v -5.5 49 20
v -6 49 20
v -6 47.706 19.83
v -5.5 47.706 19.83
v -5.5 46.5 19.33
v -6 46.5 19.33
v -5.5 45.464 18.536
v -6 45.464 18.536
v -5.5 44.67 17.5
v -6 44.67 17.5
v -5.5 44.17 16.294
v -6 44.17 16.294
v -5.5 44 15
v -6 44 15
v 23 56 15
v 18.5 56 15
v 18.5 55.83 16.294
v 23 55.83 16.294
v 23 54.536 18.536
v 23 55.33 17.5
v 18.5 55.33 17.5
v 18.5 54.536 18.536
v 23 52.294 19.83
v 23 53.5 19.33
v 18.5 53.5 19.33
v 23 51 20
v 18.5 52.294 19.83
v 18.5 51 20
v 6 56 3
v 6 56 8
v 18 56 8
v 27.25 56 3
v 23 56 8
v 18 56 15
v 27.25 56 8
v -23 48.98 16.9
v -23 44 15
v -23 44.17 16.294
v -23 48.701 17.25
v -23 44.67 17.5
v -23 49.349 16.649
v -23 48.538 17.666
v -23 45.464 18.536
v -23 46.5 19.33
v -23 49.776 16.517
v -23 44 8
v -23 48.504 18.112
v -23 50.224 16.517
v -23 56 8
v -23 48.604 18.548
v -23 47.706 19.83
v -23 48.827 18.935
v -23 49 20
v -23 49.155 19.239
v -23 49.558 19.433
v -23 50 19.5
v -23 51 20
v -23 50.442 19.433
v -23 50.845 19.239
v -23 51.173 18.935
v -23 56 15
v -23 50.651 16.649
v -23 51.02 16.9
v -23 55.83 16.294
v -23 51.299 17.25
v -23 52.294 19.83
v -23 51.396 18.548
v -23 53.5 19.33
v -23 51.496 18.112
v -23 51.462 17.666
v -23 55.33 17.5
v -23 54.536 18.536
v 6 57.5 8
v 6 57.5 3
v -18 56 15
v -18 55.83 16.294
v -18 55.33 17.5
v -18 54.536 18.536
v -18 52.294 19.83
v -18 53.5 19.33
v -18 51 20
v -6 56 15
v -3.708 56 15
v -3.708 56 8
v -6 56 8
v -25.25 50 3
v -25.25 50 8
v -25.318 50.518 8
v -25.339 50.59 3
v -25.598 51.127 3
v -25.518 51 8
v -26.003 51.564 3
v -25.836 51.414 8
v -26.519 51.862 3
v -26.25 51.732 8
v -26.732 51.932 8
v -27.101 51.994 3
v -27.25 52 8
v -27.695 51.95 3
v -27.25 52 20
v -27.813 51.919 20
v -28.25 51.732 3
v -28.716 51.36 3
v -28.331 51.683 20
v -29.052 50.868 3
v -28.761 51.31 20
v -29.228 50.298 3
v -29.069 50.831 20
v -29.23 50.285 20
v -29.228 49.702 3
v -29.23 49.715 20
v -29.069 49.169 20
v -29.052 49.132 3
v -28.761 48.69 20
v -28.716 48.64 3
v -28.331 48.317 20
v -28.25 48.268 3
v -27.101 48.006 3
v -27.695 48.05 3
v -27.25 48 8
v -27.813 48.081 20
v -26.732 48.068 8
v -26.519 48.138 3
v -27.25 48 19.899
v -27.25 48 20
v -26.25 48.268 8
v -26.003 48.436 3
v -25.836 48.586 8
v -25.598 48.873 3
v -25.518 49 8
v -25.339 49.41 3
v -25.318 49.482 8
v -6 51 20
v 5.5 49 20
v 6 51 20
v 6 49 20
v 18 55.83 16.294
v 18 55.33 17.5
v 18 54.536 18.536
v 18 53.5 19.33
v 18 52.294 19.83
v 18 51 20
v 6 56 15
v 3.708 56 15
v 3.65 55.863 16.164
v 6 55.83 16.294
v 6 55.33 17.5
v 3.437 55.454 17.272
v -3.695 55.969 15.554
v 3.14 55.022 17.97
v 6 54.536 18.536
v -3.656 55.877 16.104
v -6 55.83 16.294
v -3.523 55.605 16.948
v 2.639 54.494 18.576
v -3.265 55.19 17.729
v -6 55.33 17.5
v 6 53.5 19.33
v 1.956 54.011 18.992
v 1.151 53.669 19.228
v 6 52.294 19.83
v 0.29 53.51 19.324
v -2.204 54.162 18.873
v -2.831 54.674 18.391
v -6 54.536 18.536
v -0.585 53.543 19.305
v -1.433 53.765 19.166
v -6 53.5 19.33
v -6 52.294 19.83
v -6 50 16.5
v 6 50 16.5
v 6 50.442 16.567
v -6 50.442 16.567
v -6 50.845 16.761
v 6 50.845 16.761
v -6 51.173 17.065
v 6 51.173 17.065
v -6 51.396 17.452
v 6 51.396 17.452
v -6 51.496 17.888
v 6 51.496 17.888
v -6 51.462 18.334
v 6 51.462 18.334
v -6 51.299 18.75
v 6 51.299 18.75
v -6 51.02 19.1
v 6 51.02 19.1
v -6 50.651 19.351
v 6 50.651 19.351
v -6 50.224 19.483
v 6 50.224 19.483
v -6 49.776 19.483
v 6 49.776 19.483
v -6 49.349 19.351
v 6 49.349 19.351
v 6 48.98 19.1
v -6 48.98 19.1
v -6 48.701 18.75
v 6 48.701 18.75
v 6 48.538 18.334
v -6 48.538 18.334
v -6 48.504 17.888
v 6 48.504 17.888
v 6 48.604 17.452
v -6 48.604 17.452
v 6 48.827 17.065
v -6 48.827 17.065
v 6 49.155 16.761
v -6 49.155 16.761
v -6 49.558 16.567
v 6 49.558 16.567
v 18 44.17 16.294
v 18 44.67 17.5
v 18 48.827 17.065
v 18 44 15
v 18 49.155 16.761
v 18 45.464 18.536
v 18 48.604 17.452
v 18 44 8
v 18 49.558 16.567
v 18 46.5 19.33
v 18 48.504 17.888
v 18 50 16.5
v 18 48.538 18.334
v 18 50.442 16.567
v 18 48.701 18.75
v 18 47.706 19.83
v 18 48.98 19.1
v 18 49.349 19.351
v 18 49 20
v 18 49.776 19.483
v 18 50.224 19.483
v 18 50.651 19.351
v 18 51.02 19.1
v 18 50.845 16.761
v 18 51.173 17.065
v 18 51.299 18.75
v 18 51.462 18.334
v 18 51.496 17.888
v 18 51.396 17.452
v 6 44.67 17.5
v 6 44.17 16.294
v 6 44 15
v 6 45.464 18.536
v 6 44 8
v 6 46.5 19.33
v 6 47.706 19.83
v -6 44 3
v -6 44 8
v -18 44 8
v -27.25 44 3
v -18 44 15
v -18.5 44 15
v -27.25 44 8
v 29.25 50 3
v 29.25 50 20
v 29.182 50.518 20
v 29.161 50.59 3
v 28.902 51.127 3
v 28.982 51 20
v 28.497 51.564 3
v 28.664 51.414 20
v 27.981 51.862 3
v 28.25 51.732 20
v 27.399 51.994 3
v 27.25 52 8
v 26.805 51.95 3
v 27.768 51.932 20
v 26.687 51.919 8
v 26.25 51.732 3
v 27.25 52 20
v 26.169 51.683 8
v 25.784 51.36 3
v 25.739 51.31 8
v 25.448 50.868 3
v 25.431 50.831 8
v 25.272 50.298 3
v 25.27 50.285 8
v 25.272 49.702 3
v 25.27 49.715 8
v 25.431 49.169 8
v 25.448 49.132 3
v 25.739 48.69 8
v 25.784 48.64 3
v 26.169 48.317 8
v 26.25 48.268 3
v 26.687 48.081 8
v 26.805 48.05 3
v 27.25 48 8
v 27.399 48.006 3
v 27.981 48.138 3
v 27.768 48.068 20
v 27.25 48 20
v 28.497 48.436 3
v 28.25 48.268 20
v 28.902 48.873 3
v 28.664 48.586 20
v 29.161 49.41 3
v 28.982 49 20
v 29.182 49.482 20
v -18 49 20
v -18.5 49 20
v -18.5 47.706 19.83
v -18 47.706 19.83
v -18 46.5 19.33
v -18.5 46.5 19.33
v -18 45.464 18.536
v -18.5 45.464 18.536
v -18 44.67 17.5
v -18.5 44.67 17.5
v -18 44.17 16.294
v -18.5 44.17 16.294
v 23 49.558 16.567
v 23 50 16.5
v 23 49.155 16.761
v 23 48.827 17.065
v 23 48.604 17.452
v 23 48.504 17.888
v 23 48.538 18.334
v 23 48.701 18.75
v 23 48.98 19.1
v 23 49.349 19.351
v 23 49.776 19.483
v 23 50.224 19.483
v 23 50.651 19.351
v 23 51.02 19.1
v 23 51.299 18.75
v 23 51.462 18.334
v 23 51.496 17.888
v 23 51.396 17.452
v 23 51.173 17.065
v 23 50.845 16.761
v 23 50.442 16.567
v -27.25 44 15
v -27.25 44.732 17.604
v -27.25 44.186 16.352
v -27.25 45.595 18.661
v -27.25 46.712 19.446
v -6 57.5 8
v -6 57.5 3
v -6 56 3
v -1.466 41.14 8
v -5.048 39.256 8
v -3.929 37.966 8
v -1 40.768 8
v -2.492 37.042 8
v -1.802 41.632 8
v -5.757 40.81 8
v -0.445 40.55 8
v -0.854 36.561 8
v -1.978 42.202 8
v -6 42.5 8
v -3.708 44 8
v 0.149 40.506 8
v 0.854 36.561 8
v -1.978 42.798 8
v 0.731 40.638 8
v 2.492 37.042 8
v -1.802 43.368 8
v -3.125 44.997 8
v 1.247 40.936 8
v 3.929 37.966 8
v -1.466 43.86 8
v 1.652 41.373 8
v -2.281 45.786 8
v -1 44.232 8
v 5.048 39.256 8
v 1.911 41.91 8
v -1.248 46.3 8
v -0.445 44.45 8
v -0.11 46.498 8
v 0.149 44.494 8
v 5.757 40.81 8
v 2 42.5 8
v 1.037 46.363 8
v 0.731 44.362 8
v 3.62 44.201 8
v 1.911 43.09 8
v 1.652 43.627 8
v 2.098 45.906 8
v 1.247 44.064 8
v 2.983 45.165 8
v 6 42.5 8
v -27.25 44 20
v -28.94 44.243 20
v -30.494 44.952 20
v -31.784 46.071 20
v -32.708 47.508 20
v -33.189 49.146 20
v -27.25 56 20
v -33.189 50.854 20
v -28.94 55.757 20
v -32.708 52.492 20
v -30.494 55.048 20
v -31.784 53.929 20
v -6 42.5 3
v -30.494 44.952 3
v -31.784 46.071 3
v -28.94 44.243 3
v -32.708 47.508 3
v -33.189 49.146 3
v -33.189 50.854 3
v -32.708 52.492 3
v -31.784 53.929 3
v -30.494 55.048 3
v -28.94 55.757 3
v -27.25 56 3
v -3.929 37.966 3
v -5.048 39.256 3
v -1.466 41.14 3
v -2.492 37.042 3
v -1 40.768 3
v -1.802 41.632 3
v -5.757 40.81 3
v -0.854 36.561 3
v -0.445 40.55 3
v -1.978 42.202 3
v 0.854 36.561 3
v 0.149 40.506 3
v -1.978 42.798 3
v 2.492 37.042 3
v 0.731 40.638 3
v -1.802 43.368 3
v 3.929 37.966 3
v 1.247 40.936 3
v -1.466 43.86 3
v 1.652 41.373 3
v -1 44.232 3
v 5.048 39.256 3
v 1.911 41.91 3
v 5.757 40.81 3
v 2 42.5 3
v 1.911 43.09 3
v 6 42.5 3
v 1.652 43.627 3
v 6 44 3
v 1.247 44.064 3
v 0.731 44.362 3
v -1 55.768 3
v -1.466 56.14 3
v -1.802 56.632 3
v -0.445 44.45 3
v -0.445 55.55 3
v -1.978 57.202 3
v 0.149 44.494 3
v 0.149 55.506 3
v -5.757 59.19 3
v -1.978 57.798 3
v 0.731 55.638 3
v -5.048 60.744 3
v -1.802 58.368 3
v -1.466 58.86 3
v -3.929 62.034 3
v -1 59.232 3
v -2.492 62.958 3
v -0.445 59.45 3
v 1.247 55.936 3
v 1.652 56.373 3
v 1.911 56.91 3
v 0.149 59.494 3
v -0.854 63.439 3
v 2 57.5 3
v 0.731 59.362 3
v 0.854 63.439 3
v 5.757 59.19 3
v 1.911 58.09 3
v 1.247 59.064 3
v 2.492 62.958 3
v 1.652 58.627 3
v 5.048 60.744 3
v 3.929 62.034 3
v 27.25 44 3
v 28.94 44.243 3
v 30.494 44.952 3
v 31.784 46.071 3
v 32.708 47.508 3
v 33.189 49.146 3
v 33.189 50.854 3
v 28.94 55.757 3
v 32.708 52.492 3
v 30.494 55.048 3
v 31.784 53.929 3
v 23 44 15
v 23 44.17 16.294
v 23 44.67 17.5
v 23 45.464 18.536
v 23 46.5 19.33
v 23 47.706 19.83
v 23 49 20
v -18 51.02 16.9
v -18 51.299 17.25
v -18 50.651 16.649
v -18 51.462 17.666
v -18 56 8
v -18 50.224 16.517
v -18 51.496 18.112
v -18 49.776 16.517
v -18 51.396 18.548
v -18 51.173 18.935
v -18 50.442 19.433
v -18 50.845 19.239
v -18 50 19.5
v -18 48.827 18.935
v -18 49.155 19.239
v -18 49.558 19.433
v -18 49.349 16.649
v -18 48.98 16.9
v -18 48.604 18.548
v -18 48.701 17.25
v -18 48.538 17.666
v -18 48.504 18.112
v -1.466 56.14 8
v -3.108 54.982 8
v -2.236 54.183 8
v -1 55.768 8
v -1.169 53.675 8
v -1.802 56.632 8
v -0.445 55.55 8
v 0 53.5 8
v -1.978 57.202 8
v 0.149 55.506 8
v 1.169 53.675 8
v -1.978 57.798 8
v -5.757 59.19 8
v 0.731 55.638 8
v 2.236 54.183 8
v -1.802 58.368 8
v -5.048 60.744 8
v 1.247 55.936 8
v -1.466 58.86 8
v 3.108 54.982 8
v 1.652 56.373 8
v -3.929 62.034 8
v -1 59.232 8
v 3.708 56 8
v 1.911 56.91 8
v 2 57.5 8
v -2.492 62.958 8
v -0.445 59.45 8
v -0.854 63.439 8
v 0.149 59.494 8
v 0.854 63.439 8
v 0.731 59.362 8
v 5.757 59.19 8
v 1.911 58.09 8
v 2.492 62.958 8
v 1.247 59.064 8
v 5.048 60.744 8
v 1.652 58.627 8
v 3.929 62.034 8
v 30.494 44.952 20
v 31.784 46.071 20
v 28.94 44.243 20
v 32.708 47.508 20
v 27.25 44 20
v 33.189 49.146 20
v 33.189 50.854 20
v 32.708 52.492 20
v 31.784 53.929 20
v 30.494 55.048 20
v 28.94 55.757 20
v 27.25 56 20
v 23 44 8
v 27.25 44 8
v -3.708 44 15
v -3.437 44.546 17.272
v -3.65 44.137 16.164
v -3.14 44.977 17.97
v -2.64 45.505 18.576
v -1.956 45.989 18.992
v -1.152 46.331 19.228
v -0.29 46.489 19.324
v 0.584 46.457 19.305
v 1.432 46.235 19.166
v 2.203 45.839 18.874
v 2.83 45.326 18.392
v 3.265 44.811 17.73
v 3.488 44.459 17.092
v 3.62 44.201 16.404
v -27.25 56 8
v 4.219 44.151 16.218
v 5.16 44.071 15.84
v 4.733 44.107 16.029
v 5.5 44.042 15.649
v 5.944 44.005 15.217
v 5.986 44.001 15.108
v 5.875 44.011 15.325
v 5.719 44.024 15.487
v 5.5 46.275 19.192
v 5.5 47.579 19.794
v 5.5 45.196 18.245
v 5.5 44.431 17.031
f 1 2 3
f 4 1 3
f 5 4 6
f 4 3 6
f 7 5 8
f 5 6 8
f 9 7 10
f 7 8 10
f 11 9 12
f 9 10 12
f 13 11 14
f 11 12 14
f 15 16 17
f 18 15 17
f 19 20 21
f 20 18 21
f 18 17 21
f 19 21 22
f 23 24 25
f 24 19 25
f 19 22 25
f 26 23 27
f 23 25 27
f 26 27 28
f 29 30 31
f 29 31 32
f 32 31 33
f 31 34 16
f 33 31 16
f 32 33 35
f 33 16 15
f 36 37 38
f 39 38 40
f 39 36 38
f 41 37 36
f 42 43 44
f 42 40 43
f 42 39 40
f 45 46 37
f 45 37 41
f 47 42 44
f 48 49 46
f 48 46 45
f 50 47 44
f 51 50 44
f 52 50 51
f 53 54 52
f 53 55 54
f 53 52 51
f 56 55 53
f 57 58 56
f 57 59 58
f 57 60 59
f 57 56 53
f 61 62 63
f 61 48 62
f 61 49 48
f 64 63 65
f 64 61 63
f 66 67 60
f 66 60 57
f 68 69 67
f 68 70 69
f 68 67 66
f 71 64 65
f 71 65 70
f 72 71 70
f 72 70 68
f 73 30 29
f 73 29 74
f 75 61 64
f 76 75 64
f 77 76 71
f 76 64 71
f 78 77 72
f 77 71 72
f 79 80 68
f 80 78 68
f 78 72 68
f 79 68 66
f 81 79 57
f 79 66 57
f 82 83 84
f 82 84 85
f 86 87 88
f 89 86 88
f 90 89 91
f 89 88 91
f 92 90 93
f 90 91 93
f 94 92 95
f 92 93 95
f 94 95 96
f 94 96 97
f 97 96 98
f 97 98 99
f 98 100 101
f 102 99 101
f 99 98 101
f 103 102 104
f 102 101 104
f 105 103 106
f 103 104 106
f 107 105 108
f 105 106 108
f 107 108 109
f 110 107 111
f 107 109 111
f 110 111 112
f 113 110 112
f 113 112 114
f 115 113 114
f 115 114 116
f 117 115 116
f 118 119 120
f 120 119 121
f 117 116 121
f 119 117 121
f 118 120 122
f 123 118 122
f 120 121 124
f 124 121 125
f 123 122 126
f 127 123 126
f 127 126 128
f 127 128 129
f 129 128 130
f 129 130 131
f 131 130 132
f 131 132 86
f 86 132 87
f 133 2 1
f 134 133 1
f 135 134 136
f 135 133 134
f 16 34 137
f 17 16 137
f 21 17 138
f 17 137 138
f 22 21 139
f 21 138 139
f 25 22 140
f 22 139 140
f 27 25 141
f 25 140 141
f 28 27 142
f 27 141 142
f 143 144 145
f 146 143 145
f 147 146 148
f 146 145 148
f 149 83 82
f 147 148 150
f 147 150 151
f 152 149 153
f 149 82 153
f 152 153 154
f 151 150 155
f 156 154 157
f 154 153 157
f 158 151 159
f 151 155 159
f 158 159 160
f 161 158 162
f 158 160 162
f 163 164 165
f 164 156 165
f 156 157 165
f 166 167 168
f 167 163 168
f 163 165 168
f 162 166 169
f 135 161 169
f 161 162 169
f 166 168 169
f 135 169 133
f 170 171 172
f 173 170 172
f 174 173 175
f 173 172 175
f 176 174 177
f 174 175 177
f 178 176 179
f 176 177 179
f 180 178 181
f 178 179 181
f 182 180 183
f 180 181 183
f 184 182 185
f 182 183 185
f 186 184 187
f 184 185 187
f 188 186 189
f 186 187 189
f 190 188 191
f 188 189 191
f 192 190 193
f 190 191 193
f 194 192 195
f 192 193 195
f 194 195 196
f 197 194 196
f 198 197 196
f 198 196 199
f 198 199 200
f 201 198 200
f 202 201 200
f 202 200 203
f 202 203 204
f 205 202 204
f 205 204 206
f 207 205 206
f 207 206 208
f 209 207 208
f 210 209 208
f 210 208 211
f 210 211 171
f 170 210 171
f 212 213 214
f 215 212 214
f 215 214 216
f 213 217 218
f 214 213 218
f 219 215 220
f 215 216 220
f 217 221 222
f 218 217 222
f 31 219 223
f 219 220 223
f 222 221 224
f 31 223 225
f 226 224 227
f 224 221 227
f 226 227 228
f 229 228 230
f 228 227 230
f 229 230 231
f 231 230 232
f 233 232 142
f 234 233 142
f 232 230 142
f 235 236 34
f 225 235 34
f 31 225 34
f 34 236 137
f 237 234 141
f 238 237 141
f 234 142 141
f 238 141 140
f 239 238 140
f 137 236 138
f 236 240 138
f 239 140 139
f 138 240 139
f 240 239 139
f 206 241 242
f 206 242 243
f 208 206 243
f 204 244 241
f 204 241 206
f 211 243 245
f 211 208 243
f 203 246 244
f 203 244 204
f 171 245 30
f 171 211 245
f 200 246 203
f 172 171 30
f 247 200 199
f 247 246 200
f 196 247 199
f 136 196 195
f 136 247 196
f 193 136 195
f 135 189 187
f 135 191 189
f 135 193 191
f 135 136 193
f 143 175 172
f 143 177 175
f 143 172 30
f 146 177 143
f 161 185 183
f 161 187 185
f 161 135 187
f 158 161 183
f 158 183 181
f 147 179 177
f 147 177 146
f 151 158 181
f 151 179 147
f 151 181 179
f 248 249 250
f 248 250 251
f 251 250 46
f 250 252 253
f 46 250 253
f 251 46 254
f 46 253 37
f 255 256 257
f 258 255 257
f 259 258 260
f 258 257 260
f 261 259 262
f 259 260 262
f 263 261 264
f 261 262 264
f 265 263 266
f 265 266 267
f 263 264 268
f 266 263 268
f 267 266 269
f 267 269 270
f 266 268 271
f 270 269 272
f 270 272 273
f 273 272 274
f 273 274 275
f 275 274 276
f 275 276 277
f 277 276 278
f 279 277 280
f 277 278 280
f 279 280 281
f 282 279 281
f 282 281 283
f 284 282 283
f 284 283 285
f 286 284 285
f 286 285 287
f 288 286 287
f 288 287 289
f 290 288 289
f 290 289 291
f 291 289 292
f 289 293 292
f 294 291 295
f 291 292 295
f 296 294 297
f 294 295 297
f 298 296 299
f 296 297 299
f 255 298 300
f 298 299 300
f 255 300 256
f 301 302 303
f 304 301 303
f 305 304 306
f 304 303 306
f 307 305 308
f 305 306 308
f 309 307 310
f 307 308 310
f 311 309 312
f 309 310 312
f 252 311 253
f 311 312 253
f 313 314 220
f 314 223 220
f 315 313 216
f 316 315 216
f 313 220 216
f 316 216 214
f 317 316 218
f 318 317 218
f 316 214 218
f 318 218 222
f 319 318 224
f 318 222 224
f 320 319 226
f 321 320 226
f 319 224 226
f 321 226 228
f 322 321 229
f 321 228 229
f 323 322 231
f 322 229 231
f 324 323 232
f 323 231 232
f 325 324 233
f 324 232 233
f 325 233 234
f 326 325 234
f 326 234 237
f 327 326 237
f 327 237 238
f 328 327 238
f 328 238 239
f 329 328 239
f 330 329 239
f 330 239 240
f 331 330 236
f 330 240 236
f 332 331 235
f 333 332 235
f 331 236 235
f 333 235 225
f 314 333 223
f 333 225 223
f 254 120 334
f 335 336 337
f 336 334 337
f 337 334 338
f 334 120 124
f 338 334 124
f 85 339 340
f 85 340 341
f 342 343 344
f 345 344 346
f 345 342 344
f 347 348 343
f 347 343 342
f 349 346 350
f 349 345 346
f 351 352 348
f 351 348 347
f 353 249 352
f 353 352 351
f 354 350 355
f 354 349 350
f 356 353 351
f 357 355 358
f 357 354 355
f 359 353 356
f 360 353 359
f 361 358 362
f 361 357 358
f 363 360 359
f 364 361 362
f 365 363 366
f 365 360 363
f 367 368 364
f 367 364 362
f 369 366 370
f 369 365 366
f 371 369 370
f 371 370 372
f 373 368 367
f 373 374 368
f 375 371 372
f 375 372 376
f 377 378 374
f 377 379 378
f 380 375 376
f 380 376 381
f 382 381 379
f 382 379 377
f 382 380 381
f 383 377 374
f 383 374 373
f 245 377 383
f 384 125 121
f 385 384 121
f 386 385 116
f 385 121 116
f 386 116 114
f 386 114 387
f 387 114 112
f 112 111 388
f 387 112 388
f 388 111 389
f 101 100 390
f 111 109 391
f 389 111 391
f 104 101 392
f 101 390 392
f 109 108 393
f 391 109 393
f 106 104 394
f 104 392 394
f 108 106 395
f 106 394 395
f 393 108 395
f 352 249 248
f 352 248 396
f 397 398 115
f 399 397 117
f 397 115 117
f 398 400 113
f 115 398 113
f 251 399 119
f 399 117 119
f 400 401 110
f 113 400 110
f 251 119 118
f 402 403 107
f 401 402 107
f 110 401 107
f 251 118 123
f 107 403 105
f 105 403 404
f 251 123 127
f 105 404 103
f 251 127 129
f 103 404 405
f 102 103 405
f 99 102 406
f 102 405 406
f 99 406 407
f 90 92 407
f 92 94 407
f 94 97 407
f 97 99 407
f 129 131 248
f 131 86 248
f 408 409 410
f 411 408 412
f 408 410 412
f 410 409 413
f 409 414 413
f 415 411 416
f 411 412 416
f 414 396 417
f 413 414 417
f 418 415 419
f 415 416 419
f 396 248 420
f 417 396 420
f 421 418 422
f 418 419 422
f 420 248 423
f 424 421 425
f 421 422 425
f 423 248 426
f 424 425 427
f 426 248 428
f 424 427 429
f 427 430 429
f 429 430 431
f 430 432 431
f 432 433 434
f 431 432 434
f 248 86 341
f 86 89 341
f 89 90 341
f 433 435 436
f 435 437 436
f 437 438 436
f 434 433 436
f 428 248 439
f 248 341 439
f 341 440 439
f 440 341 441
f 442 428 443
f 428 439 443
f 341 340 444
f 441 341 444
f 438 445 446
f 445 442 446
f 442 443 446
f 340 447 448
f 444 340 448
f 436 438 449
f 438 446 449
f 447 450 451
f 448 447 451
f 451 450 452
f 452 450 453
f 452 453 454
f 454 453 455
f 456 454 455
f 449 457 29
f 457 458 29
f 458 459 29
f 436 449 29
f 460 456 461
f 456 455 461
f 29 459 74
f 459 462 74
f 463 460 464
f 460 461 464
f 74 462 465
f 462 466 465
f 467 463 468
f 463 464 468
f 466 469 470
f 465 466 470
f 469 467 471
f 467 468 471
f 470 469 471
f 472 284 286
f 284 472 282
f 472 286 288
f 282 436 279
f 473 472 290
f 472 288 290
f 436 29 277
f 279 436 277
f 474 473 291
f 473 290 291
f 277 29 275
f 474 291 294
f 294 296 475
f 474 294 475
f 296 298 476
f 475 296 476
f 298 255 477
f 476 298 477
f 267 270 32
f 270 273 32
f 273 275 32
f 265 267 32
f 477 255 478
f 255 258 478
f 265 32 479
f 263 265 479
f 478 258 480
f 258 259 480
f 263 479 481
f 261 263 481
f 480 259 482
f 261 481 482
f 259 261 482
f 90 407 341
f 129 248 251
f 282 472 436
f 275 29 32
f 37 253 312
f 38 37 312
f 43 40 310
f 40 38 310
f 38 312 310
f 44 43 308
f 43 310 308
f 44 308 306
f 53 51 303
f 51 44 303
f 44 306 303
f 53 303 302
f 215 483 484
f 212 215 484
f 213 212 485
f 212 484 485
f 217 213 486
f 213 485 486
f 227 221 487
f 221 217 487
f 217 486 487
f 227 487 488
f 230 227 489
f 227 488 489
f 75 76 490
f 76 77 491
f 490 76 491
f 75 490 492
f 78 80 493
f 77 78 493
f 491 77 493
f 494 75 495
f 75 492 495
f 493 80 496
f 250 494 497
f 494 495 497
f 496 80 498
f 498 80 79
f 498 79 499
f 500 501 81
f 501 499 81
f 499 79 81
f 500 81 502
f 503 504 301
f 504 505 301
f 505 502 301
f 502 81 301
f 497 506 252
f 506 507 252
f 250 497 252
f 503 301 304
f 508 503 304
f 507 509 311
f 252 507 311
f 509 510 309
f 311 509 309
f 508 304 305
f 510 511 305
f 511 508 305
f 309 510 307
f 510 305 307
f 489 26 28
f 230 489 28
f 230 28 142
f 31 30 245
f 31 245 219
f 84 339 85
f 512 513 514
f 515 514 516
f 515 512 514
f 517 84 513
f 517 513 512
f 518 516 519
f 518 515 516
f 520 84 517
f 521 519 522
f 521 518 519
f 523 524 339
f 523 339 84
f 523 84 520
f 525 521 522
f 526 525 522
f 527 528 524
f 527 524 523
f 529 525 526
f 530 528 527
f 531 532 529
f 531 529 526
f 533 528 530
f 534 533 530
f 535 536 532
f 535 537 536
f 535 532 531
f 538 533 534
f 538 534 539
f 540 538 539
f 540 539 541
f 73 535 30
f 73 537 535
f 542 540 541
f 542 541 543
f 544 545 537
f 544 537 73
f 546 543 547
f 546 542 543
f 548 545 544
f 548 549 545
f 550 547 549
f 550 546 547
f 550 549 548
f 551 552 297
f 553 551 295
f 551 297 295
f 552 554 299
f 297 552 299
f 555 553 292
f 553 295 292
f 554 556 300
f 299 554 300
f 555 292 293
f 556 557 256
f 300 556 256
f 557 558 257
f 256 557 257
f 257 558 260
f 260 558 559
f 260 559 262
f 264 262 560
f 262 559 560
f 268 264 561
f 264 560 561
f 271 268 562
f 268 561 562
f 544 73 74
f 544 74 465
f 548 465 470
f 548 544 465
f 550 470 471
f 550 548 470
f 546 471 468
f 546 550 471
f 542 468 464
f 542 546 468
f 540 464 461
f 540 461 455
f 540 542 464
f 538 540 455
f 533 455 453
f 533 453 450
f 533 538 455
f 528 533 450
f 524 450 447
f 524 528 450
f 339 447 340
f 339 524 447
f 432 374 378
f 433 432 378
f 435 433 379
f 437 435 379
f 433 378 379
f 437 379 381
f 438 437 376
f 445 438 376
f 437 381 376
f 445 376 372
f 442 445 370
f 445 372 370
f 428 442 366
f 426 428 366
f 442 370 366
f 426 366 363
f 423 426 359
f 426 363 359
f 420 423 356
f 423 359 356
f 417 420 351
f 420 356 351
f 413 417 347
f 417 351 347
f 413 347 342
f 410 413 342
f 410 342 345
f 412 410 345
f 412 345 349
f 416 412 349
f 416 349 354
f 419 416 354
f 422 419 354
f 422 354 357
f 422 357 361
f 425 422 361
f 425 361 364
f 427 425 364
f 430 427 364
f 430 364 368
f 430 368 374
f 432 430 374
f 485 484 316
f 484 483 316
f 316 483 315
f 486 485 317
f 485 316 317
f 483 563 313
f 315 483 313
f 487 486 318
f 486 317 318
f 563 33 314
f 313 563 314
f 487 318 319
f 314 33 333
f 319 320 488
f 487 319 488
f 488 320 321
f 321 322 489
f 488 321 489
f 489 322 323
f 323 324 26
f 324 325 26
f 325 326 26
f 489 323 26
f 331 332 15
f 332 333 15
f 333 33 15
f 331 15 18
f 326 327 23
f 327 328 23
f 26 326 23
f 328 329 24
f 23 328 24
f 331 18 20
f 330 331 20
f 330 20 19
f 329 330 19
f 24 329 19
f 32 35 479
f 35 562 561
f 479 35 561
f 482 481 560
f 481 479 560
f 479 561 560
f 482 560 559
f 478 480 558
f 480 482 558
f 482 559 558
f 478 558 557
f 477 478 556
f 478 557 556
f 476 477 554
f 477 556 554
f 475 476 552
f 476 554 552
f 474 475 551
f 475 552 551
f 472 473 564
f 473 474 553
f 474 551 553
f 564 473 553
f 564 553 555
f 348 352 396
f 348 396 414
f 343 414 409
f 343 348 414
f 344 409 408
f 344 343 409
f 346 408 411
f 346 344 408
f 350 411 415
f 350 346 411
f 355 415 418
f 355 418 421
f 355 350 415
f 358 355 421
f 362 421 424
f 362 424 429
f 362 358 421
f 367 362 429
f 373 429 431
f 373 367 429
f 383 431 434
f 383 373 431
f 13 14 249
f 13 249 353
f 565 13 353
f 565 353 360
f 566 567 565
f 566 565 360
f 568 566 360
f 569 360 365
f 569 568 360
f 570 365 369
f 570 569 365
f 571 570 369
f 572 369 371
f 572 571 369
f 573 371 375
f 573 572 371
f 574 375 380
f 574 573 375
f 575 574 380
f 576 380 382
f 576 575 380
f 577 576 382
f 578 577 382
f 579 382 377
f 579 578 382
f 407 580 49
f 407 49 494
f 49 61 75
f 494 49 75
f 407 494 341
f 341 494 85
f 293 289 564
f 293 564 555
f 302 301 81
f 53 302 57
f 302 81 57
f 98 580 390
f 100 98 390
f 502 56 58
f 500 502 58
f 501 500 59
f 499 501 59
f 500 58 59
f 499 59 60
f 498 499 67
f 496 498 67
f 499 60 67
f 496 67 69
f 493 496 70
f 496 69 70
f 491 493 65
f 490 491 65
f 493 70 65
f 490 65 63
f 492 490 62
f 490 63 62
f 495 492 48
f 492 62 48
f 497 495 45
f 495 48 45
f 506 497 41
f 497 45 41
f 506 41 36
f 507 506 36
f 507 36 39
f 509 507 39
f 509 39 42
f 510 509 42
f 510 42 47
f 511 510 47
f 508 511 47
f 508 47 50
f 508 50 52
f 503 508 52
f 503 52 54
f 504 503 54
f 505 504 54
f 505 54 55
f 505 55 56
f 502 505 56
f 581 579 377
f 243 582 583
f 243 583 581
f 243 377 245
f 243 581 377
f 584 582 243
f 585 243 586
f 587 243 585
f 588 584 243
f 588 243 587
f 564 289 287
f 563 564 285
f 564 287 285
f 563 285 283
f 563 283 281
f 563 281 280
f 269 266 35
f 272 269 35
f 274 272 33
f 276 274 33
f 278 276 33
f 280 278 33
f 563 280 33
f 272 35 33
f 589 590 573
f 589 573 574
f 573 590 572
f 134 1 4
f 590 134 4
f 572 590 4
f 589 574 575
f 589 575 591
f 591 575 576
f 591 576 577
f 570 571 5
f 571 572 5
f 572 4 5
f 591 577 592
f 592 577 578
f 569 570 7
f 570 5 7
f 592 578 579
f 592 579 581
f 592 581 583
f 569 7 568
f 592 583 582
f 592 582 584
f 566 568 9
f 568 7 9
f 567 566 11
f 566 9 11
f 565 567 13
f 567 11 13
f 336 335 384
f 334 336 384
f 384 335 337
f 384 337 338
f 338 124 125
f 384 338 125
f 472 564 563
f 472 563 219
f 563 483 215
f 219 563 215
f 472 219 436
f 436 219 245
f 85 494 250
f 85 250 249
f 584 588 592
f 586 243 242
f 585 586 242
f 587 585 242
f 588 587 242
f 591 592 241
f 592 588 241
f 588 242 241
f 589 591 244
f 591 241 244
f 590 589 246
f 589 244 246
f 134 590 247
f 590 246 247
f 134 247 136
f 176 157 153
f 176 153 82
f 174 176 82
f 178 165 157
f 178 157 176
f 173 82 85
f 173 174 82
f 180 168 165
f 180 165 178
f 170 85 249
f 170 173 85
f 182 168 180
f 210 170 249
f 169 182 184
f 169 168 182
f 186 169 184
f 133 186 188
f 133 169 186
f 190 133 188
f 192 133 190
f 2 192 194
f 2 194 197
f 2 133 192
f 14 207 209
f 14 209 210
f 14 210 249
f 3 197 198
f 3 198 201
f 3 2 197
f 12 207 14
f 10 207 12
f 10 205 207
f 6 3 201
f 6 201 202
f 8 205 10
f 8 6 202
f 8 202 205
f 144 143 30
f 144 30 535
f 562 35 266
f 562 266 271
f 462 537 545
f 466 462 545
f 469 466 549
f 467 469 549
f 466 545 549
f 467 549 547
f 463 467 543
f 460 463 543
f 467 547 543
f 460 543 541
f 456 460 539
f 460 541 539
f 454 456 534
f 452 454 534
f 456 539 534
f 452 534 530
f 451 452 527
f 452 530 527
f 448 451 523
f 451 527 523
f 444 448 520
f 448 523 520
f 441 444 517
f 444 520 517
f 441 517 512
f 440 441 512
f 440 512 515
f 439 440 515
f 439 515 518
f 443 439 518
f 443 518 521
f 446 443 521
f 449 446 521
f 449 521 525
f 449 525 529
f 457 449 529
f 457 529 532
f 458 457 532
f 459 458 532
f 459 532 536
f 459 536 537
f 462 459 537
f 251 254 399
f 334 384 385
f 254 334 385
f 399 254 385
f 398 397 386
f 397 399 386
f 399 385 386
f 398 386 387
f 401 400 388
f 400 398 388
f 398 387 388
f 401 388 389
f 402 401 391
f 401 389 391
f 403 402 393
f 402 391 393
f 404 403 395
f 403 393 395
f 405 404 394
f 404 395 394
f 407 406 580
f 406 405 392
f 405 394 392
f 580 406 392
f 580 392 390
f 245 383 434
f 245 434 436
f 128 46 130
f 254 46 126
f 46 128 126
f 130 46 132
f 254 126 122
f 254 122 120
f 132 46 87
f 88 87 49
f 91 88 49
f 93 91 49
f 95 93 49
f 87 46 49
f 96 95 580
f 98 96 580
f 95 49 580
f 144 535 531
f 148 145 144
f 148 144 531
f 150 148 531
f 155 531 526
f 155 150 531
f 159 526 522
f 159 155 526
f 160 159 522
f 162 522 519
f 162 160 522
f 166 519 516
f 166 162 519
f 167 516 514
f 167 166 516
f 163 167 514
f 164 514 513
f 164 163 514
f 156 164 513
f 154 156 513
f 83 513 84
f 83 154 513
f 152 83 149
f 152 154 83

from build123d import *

# Parameters (mm, degrees)
BOSS_EXTRUDE1_DEPTH          = 5
BOSS_EXTRUDE2_START          = 12
BOSS_EXTRUDE2_DEPTH          = 12
BOSS_EXTRUDE3_START          = 12
BOSS_EXTRUDE3_DEPTH          = 12
SKETCH4_W                    = 4.25
SKETCH4_H                    = 12
CUT_EXTRUDE1_DEPTH           = 44.425942707
SKETCH5_W                    = 4.25
SKETCH5_H                    = 12
CUT_EXTRUDE2_DEPTH           = 44.425942707
BOSS_EXTRUDE4_REACH          = 75.667
F_3_0_3_DIAMETER_HOLE1_D     = 3
F_3_0_3_DIAMETER_HOLE1_DEPTH = 12
SKETCH9_W                    = 1.5
SKETCH9_H                    = 5
F_3_0_3_DIAMETER_HOLE3_D     = 3
F_3_0_3_DIAMETER_HOLE3_DEPTH = 5
F_4_0_4_DIAMETER_HOLE1_D     = 4
F_4_0_4_DIAMETER_HOLE1_DEPTH = 17
FILLET1_R                    = 5
SKETCH15_W                   = 102.81130979
SKETCH15_H                   = 78.647232544
CUT_EXTRUDE3_DEPTH           = 10


with BuildPart() as part:
    # Sketch1 → Boss-Extrude1 (new body)
    with BuildSketch(Plane.XY.offset(8)):
        with BuildLine():
            Line((-6, 57.5), (-6, 56))
            Line((-6, 56), (-27.25, 56))
            ThreePointArc((-27.25, 56), (-33.25, 50), (-27.25, 44))
            Line((-27.25, 44), (-6, 44))
            Line((-6, 44), (-6, 42.5))
            ThreePointArc((-6, 42.5), (0, 36.5), (6, 42.5))
            Line((6, 42.5), (6, 44))
            Line((6, 44), (27.25, 44))
            ThreePointArc((27.25, 44), (33.25, 50), (27.25, 56))
            Line((27.25, 56), (6, 56))
            Line((6, 56), (6, 57.5))
            ThreePointArc((6, 57.5), (0, 63.5), (-6, 57.5))
        make_face()
    extrude(amount=-BOSS_EXTRUDE1_DEPTH)

    # Sketch2 → Boss-Extrude2 (add)
    with BuildSketch(Plane.XY.offset(8).offset(BOSS_EXTRUDE2_START)):
        with BuildLine():
            Line((27.25, 44), (18, 44))
            Line((18, 44), (18, 56))
            Line((18, 56), (27.25, 56))
            ThreePointArc((27.25, 56), (33.25, 50), (27.25, 44))
        make_face()
    extrude(amount=-BOSS_EXTRUDE2_DEPTH)

    # Sketch3 → Boss-Extrude3 (add)
    with BuildSketch(Plane.XY.offset(8).offset(BOSS_EXTRUDE3_START)):
        with BuildLine():
            Line((-27.25, 56), (-18, 56))
            Line((-18, 56), (-18, 44))
            Line((-18, 44), (-27.25, 44))
            ThreePointArc((-27.25, 44), (-33.25, 50), (-27.25, 56))
        make_face()
    extrude(amount=-BOSS_EXTRUDE3_DEPTH)

    # Sketch4 → Cut-Extrude1 (cut, through all)
    with BuildSketch(Plane(origin=(0, 56, 0), x_dir=(-1, 0, 0), z_dir=(0, 1, 0))):
        with Locations((-25.125, 14)):
            Rectangle(SKETCH4_W, SKETCH4_H)
    extrude(amount=-CUT_EXTRUDE1_DEPTH, mode=Mode.SUBTRACT)

    # Sketch5 → Cut-Extrude2 (cut, through all)
    with BuildSketch(Plane(origin=(0, 56, 0), x_dir=(-1, 0, 0), z_dir=(0, 1, 0))):
        with Locations((25.125, 14)):
            Rectangle(SKETCH5_W, SKETCH5_H)
    extrude(amount=-CUT_EXTRUDE2_DEPTH, mode=Mode.SUBTRACT)

    # Sketch6 → Boss-Extrude4 (add, up to next)
    with BuildSketch(Plane.XY.offset(20), mode=Mode.PRIVATE) as boss_extrude4_sk1:
        with BuildLine():
            Line((6, 44), (6, 56))
            Line((6, 56), (3.708099244, 56))
            ThreePointArc((3.708099244, 56), (0, 53.5), (-3.708099244, 56))
            Line((-3.708099244, 56), (-6, 56))
            Line((-6, 56), (-6, 44))
            Line((-6, 44), (-3.708099244, 44))
            ThreePointArc((-3.708099244, 44), (-0.109747314, 46.498494157), (3.620236982, 44.201142026))
            Line((3.620236982, 44.201142026), (6, 44))
        make_face()
    boss_extrude4_tool1 = extrude(boss_extrude4_sk1.sketch, amount=-BOSS_EXTRUDE4_REACH, mode=Mode.PRIVATE) - part.part
    add(boss_extrude4_tool1.solids().sort_by_distance((-0.008751, 50.011684, 20))[0])

    # Ø3.0 (3) Diameter Hole1
    with Locations(Plane.ZY.offset(6)):
        with Locations((18, 50)):
            Hole(F_3_0_3_DIAMETER_HOLE1_D / 2, depth=F_3_0_3_DIAMETER_HOLE1_DEPTH)

    # Sketch9 → Ø3.0 (3) Diameter Hole2 (revolve, cut)
    with BuildSketch(Plane(origin=(23, 50, 18), x_dir=(0, 0, -1), z_dir=(0, 1, 0))):
        with Locations((0.75, 2.5)):
            Rectangle(SKETCH9_W, SKETCH9_H)
    revolve(axis=Axis((29.35, 50, 18), (-1, 0, 0)), mode=Mode.SUBTRACT)

    # Ø3.0 (3) Diameter Hole3
    with Locations(Plane(origin=(-18, 0, 0), x_dir=(0, 0, -1), z_dir=(1, 0, 0))):
        with Locations((-18, 50)):
            Hole(F_3_0_3_DIAMETER_HOLE3_D / 2, depth=F_3_0_3_DIAMETER_HOLE3_DEPTH)

    # Ø4.0 (4) Diameter Hole1
    with Locations(Plane(origin=(0, 0, 3), x_dir=(-1, 0, 0), z_dir=(0, 0, -1))):
        with Locations((0, 57.5), (-27.25, 50), (27.25, 50), (0, 42.5)):
            Hole(F_4_0_4_DIAMETER_HOLE1_D / 2, depth=F_4_0_4_DIAMETER_HOLE1_DEPTH)

    # Fillet1
    # the kernel refuses this fillet: 5 mm, written as the material it takes off along each edge
    with BuildSketch(Plane(origin=(-35.5, 56, 20), x_dir=(0, 0, -1), z_dir=(1, 0, 0))) as fillet1_piece_1_section:
        with BuildLine():
            CenterArc((FILLET1_R, -FILLET1_R), FILLET1_R, 90, 90)
            Line((0, -FILLET1_R), (0, 0))
            Line((0, 0), (FILLET1_R, 0))
        make_face()
    fillet1_piece_1 = extrude(amount=30, mode=Mode.PRIVATE)
    fillet1_piece_1 = split(fillet1_piece_1, bisect_by=Plane(origin=(-27.25, 53.041631107, 19.755841734), z_dir=(1, 0, 0)), keep=Keep.TOP, mode=Mode.PRIVATE)
    add(fillet1_piece_1, mode=Mode.SUBTRACT)
    with BuildSketch(Plane(origin=(35.5, 44, 20), x_dir=(0, 0, -1), z_dir=(-1, 0, 0))) as fillet1_piece_2_section:
        with BuildLine():
            CenterArc((FILLET1_R, -FILLET1_R), FILLET1_R, 90, 90)
            Line((0, -FILLET1_R), (0, 0))
            Line((0, 0), (FILLET1_R, 0))
        make_face()
    fillet1_piece_2 = extrude(amount=30, mode=Mode.PRIVATE)
    fillet1_piece_2 = split(fillet1_piece_2, bisect_by=Plane(origin=(27.25, 46.958368888, 19.755841732), z_dir=(-1, 0, 0)), keep=Keep.TOP, mode=Mode.PRIVATE)
    add(fillet1_piece_2, mode=Mode.SUBTRACT)
    with BuildSketch(Plane(origin=(5.5, 56, 20), x_dir=(0, 0, -1), z_dir=(1, 0, 0))) as fillet1_piece_3_section:
        with BuildLine():
            CenterArc((FILLET1_R, -FILLET1_R), FILLET1_R, 90, 90)
            Line((0, -FILLET1_R), (0, 0))
            Line((0, 0), (FILLET1_R, 0))
        make_face()
    fillet1_piece_3 = extrude(amount=30, mode=Mode.PRIVATE)
    fillet1_piece_3 = split(fillet1_piece_3, bisect_by=Plane(origin=(27.25, 54.883160305, 18.883160305), z_dir=(-1, 0, 0)), keep=Keep.TOP, mode=Mode.PRIVATE)
    add(fillet1_piece_3, mode=Mode.SUBTRACT)
    with BuildSketch(Plane(origin=(-18.5, 44, 20), x_dir=(0, 1, 0), z_dir=(1, 0, 0))) as fillet1_piece_4:
        with BuildLine():
            CenterArc((FILLET1_R, -FILLET1_R), FILLET1_R, 90, 90)
            Line((0, -FILLET1_R), (0, 0))
            Line((0, 0), (FILLET1_R, 0))
        make_face()
    extrude(amount=27.291900756, mode=Mode.SUBTRACT)
    with BuildSketch(Plane(origin=(18.5, 56, 20), x_dir=(0, 0, -1), z_dir=(-1, 0, 0))) as fillet1_piece_5:
        with BuildLine():
            CenterArc((FILLET1_R, FILLET1_R), FILLET1_R, 180, 90)
            Line((0, FILLET1_R), (0, 0))
            Line((0, 0), (FILLET1_R, 0))
        make_face()
    extrude(amount=27.291900756, mode=Mode.SUBTRACT)
    with BuildSketch(Plane(origin=(-5.5, 44, 20), x_dir=(0, 1, 0), z_dir=(-1, 0, 0))) as fillet1_piece_6_section:
        with BuildLine():
            CenterArc((FILLET1_R, FILLET1_R), FILLET1_R, 180, 90)
            Line((0, FILLET1_R), (0, 0))
            Line((0, 0), (FILLET1_R, 0))
        make_face()
    fillet1_piece_6 = extrude(amount=30, mode=Mode.PRIVATE)
    fillet1_piece_6 = split(fillet1_piece_6, bisect_by=Plane(origin=(-27.25, 45.116839695, 18.883160305), z_dir=(1, 0, 0)), keep=Keep.TOP, mode=Mode.PRIVATE)
    add(fillet1_piece_6, mode=Mode.SUBTRACT)

    # Sketch15 → Cut-Extrude3 (cut)
    with BuildSketch(Plane(origin=(0, 0, 3), x_dir=(-1, 0, 0), z_dir=(0, 0, -1))):
        with Locations((1.036291242, 56.487506321)):
            Rectangle(SKETCH15_W, SKETCH15_H)
    extrude(amount=CUT_EXTRUDE3_DEPTH, mode=Mode.SUBTRACT)


solid = part.part
